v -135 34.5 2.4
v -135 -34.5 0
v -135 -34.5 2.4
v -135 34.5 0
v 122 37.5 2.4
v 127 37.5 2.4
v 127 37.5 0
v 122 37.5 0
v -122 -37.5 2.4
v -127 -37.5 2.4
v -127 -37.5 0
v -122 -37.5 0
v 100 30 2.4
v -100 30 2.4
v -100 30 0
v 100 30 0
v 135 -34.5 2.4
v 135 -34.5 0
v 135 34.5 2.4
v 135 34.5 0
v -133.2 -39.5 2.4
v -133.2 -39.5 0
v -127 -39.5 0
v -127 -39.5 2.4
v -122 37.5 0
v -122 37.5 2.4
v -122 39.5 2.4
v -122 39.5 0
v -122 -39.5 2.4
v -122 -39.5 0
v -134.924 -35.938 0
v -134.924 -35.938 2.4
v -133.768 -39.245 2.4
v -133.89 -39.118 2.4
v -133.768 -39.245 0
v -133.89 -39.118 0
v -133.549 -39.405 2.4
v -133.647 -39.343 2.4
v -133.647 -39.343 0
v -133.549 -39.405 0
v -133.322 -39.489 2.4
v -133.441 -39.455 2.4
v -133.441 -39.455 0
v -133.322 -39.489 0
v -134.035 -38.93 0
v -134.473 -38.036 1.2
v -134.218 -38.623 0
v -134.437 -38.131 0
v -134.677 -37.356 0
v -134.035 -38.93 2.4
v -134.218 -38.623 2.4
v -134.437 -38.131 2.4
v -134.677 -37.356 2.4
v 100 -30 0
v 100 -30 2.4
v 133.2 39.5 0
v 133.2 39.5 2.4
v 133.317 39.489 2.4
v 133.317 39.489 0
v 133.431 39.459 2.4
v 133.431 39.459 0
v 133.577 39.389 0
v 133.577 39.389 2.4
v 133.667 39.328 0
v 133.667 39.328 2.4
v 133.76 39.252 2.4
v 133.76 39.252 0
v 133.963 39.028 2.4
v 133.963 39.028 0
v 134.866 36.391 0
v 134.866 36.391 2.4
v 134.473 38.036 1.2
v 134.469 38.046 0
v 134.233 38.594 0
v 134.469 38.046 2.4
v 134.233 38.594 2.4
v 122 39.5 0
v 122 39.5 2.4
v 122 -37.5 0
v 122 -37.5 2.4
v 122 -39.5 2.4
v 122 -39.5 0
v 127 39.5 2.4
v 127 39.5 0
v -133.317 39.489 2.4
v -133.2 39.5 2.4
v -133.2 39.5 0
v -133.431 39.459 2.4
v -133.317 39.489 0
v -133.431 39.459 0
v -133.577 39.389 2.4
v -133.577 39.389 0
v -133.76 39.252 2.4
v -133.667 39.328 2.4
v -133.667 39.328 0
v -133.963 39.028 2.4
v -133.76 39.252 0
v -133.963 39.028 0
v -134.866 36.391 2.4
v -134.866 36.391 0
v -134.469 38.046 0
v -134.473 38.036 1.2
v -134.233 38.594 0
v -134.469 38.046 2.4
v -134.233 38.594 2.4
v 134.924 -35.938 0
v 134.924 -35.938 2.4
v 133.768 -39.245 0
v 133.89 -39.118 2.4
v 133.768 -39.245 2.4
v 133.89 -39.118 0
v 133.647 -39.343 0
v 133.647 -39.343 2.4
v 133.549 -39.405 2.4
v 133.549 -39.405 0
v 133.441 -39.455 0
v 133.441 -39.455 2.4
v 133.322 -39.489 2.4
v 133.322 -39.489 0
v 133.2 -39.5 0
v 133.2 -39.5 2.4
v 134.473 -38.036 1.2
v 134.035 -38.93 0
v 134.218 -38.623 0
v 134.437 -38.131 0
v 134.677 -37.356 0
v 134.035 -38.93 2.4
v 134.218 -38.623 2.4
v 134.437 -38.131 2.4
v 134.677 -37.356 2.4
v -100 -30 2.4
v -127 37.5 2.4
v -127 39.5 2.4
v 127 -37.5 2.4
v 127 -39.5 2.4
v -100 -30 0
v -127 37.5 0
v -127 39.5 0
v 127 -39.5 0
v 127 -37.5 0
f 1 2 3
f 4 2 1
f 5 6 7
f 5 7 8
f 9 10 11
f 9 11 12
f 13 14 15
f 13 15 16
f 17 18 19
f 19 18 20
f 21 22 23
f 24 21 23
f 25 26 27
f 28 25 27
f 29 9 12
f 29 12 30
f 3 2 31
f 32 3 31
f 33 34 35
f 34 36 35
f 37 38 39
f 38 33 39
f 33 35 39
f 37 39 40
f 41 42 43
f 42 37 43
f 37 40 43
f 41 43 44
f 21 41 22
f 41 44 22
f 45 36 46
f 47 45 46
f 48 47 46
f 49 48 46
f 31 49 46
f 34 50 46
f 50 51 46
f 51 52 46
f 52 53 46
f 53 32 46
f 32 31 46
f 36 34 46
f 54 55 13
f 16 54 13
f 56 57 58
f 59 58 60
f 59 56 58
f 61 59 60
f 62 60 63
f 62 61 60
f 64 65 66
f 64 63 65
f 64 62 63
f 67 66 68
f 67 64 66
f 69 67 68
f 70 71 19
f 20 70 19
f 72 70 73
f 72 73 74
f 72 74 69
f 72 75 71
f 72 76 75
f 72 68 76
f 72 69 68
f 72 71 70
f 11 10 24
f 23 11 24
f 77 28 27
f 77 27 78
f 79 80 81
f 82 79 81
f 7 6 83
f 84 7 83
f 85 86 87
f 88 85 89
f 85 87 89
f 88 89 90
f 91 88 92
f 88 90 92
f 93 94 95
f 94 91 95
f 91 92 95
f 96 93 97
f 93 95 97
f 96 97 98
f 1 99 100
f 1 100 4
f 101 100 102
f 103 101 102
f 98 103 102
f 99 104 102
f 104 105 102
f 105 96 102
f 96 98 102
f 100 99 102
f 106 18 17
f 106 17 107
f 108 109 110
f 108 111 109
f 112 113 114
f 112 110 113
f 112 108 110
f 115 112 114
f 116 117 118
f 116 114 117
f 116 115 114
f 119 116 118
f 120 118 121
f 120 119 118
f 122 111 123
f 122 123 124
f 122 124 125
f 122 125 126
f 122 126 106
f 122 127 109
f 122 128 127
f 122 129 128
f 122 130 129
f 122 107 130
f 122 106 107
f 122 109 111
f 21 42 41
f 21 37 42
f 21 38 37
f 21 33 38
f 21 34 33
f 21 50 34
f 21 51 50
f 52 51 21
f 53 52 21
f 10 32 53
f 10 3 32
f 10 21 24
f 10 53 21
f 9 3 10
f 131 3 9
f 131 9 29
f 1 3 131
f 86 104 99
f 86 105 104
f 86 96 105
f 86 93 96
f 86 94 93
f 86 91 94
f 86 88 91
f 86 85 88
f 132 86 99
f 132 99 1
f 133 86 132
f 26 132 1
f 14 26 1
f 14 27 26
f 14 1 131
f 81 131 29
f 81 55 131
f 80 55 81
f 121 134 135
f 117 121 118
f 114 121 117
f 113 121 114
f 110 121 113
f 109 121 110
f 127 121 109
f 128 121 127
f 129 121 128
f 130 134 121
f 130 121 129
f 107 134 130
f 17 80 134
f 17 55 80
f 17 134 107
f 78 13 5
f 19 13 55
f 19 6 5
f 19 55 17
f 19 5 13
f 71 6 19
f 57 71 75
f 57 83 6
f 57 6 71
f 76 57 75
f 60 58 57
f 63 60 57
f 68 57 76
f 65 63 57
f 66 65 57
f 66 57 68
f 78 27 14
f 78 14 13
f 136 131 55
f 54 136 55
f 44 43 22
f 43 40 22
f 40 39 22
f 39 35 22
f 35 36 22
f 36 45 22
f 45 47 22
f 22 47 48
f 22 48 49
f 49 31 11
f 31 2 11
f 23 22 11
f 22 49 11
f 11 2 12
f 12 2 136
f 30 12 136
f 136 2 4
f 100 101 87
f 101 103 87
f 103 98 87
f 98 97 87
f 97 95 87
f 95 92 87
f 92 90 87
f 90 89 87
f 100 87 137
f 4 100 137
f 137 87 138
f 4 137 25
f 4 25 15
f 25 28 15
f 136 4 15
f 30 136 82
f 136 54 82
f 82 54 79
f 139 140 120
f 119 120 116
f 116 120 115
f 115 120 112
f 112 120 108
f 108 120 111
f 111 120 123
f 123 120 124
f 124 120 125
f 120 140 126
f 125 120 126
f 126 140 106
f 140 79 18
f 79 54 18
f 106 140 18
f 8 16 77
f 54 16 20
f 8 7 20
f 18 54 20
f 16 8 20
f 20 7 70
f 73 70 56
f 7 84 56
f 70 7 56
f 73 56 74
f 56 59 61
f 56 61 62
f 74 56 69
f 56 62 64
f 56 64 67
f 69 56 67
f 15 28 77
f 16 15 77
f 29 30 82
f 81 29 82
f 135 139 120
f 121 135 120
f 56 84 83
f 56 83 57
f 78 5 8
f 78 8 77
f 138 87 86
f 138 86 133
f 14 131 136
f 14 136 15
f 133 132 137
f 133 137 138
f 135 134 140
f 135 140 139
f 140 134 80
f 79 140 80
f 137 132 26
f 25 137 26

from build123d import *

# Parameters (mm, degrees)
SKETCH_1_W               = 270
SKETCH_1_H               = 79
EXTRUDE_1_DEPTH          = 2.4
SKETCH_2_W               = 200
SKETCH_2_H               = 60
CUT_EXTRUDE_1_DEPTH      = 141.680524594
FILLET_1_SIZE            = 5
FILLET_1_SIZE_2          = 1.8
SKETCH_3_W               = 5
SKETCH_3_H               = 2
CUT_EXTRUDE_2_DEPTH      = 141.68052472
MIRROR_2_COPY_1_SKETCH_W = 5
MIRROR_2_COPY_1_SKETCH_H = 2
MIRROR_2_COPY_1_DEPTH    = 141.68052472


with BuildPart() as part:
    # 草图1 → 凸台-拉伸1 (new body)
    with BuildSketch(Plane.XY):
        Rectangle(SKETCH_1_W, SKETCH_1_H)
    extrude(amount=EXTRUDE_1_DEPTH)

    # 草图2 → 切除-拉伸1 (cut, through all)
    with BuildSketch(Plane.XY.offset(2.4)):
        Rectangle(SKETCH_2_W, SKETCH_2_H)
    extrude(amount=-CUT_EXTRUDE_1_DEPTH, mode=Mode.SUBTRACT)

    # 圆角1
    # an asymmetric fillet: 5, 1.8 mm, written as the material it takes off along each edge
    with BuildSketch(Plane(origin=(135, -39.5, -12.5), x_dir=(0, 1, 0), z_dir=(0, 0, 1))) as fillet_1_piece_1:
        with BuildLine():
            Bezier((FILLET_1_SIZE, 0), (0, 0), (0, FILLET_1_SIZE_2), weights=[1, 0.707106781, 1])
            Line((0, FILLET_1_SIZE_2), (0, 0))
            Line((0, 0), (FILLET_1_SIZE, 0))
        make_face()
    extrude(amount=27.4, mode=Mode.SUBTRACT)
    with BuildSketch(Plane(origin=(135, 39.5, -12.5), x_dir=(-1, 0, 0), z_dir=(0, 0, 1))) as fillet_1_piece_2:
        with BuildLine():
            Bezier((FILLET_1_SIZE_2, 0), (0, 0), (0, FILLET_1_SIZE), weights=[1, 0.707106781, 1])
            Line((0, FILLET_1_SIZE), (0, 0))
            Line((0, 0), (FILLET_1_SIZE_2, 0))
        make_face()
    extrude(amount=27.4, mode=Mode.SUBTRACT)
    with BuildSketch(Plane(origin=(-135, -39.5, -12.5), x_dir=(0, 1, 0), z_dir=(0, 0, 1))) as fillet_1_piece_3:
        with BuildLine():
            Bezier((FILLET_1_SIZE, 0), (0, 0), (0, -FILLET_1_SIZE_2), weights=[1, 0.707106781, 1])
            Line((0, -FILLET_1_SIZE_2), (0, 0))
            Line((0, 0), (FILLET_1_SIZE, 0))
        make_face()
    extrude(amount=27.4, mode=Mode.SUBTRACT)
    with BuildSketch(Plane(origin=(-135, 39.5, -12.5), x_dir=(1, 0, 0), z_dir=(0, 0, 1))) as fillet_1_piece_4:
        with BuildLine():
            Bezier((FILLET_1_SIZE_2, 0), (0, 0), (0, -FILLET_1_SIZE), weights=[1, 0.707106781, 1])
            Line((0, -FILLET_1_SIZE), (0, 0))
            Line((0, 0), (FILLET_1_SIZE_2, 0))
        make_face()
    extrude(amount=27.4, mode=Mode.SUBTRACT)

    # 草图3 → 切除-拉伸2 (cut, through all)
    with BuildSketch(Plane.XY.offset(2.4)):
        with Locations((-124.5, 38.5)):
            Rectangle(SKETCH_3_W, SKETCH_3_H)
    cut_extrude_2 = extrude(amount=-CUT_EXTRUDE_2_DEPTH, mode=Mode.SUBTRACT)

    # 镜向1: 切除-拉伸2 across plane
    add(cut_extrude_2.mirror(Plane.ZX), mode=Mode.SUBTRACT)

    # 镜向2: 切除-拉伸2 across plane
    add(cut_extrude_2.mirror(Plane(origin=(0, 0, 0), x_dir=(0, 0, 1), z_dir=(1, 0, 0))), mode=Mode.SUBTRACT)

    # 镜向2 copy 1 sketch → 镜向2 copy 1 (cut, through all)
    with BuildSketch(Plane(origin=(0, 0, 2.4), x_dir=(-1, 0, 0), z_dir=(0, 0, 1))):
        with Locations((-124.5, 38.5)):
            Rectangle(MIRROR_2_COPY_1_SKETCH_W, MIRROR_2_COPY_1_SKETCH_H)
    extrude(amount=-MIRROR_2_COPY_1_DEPTH, mode=Mode.SUBTRACT)


solid = part.part
